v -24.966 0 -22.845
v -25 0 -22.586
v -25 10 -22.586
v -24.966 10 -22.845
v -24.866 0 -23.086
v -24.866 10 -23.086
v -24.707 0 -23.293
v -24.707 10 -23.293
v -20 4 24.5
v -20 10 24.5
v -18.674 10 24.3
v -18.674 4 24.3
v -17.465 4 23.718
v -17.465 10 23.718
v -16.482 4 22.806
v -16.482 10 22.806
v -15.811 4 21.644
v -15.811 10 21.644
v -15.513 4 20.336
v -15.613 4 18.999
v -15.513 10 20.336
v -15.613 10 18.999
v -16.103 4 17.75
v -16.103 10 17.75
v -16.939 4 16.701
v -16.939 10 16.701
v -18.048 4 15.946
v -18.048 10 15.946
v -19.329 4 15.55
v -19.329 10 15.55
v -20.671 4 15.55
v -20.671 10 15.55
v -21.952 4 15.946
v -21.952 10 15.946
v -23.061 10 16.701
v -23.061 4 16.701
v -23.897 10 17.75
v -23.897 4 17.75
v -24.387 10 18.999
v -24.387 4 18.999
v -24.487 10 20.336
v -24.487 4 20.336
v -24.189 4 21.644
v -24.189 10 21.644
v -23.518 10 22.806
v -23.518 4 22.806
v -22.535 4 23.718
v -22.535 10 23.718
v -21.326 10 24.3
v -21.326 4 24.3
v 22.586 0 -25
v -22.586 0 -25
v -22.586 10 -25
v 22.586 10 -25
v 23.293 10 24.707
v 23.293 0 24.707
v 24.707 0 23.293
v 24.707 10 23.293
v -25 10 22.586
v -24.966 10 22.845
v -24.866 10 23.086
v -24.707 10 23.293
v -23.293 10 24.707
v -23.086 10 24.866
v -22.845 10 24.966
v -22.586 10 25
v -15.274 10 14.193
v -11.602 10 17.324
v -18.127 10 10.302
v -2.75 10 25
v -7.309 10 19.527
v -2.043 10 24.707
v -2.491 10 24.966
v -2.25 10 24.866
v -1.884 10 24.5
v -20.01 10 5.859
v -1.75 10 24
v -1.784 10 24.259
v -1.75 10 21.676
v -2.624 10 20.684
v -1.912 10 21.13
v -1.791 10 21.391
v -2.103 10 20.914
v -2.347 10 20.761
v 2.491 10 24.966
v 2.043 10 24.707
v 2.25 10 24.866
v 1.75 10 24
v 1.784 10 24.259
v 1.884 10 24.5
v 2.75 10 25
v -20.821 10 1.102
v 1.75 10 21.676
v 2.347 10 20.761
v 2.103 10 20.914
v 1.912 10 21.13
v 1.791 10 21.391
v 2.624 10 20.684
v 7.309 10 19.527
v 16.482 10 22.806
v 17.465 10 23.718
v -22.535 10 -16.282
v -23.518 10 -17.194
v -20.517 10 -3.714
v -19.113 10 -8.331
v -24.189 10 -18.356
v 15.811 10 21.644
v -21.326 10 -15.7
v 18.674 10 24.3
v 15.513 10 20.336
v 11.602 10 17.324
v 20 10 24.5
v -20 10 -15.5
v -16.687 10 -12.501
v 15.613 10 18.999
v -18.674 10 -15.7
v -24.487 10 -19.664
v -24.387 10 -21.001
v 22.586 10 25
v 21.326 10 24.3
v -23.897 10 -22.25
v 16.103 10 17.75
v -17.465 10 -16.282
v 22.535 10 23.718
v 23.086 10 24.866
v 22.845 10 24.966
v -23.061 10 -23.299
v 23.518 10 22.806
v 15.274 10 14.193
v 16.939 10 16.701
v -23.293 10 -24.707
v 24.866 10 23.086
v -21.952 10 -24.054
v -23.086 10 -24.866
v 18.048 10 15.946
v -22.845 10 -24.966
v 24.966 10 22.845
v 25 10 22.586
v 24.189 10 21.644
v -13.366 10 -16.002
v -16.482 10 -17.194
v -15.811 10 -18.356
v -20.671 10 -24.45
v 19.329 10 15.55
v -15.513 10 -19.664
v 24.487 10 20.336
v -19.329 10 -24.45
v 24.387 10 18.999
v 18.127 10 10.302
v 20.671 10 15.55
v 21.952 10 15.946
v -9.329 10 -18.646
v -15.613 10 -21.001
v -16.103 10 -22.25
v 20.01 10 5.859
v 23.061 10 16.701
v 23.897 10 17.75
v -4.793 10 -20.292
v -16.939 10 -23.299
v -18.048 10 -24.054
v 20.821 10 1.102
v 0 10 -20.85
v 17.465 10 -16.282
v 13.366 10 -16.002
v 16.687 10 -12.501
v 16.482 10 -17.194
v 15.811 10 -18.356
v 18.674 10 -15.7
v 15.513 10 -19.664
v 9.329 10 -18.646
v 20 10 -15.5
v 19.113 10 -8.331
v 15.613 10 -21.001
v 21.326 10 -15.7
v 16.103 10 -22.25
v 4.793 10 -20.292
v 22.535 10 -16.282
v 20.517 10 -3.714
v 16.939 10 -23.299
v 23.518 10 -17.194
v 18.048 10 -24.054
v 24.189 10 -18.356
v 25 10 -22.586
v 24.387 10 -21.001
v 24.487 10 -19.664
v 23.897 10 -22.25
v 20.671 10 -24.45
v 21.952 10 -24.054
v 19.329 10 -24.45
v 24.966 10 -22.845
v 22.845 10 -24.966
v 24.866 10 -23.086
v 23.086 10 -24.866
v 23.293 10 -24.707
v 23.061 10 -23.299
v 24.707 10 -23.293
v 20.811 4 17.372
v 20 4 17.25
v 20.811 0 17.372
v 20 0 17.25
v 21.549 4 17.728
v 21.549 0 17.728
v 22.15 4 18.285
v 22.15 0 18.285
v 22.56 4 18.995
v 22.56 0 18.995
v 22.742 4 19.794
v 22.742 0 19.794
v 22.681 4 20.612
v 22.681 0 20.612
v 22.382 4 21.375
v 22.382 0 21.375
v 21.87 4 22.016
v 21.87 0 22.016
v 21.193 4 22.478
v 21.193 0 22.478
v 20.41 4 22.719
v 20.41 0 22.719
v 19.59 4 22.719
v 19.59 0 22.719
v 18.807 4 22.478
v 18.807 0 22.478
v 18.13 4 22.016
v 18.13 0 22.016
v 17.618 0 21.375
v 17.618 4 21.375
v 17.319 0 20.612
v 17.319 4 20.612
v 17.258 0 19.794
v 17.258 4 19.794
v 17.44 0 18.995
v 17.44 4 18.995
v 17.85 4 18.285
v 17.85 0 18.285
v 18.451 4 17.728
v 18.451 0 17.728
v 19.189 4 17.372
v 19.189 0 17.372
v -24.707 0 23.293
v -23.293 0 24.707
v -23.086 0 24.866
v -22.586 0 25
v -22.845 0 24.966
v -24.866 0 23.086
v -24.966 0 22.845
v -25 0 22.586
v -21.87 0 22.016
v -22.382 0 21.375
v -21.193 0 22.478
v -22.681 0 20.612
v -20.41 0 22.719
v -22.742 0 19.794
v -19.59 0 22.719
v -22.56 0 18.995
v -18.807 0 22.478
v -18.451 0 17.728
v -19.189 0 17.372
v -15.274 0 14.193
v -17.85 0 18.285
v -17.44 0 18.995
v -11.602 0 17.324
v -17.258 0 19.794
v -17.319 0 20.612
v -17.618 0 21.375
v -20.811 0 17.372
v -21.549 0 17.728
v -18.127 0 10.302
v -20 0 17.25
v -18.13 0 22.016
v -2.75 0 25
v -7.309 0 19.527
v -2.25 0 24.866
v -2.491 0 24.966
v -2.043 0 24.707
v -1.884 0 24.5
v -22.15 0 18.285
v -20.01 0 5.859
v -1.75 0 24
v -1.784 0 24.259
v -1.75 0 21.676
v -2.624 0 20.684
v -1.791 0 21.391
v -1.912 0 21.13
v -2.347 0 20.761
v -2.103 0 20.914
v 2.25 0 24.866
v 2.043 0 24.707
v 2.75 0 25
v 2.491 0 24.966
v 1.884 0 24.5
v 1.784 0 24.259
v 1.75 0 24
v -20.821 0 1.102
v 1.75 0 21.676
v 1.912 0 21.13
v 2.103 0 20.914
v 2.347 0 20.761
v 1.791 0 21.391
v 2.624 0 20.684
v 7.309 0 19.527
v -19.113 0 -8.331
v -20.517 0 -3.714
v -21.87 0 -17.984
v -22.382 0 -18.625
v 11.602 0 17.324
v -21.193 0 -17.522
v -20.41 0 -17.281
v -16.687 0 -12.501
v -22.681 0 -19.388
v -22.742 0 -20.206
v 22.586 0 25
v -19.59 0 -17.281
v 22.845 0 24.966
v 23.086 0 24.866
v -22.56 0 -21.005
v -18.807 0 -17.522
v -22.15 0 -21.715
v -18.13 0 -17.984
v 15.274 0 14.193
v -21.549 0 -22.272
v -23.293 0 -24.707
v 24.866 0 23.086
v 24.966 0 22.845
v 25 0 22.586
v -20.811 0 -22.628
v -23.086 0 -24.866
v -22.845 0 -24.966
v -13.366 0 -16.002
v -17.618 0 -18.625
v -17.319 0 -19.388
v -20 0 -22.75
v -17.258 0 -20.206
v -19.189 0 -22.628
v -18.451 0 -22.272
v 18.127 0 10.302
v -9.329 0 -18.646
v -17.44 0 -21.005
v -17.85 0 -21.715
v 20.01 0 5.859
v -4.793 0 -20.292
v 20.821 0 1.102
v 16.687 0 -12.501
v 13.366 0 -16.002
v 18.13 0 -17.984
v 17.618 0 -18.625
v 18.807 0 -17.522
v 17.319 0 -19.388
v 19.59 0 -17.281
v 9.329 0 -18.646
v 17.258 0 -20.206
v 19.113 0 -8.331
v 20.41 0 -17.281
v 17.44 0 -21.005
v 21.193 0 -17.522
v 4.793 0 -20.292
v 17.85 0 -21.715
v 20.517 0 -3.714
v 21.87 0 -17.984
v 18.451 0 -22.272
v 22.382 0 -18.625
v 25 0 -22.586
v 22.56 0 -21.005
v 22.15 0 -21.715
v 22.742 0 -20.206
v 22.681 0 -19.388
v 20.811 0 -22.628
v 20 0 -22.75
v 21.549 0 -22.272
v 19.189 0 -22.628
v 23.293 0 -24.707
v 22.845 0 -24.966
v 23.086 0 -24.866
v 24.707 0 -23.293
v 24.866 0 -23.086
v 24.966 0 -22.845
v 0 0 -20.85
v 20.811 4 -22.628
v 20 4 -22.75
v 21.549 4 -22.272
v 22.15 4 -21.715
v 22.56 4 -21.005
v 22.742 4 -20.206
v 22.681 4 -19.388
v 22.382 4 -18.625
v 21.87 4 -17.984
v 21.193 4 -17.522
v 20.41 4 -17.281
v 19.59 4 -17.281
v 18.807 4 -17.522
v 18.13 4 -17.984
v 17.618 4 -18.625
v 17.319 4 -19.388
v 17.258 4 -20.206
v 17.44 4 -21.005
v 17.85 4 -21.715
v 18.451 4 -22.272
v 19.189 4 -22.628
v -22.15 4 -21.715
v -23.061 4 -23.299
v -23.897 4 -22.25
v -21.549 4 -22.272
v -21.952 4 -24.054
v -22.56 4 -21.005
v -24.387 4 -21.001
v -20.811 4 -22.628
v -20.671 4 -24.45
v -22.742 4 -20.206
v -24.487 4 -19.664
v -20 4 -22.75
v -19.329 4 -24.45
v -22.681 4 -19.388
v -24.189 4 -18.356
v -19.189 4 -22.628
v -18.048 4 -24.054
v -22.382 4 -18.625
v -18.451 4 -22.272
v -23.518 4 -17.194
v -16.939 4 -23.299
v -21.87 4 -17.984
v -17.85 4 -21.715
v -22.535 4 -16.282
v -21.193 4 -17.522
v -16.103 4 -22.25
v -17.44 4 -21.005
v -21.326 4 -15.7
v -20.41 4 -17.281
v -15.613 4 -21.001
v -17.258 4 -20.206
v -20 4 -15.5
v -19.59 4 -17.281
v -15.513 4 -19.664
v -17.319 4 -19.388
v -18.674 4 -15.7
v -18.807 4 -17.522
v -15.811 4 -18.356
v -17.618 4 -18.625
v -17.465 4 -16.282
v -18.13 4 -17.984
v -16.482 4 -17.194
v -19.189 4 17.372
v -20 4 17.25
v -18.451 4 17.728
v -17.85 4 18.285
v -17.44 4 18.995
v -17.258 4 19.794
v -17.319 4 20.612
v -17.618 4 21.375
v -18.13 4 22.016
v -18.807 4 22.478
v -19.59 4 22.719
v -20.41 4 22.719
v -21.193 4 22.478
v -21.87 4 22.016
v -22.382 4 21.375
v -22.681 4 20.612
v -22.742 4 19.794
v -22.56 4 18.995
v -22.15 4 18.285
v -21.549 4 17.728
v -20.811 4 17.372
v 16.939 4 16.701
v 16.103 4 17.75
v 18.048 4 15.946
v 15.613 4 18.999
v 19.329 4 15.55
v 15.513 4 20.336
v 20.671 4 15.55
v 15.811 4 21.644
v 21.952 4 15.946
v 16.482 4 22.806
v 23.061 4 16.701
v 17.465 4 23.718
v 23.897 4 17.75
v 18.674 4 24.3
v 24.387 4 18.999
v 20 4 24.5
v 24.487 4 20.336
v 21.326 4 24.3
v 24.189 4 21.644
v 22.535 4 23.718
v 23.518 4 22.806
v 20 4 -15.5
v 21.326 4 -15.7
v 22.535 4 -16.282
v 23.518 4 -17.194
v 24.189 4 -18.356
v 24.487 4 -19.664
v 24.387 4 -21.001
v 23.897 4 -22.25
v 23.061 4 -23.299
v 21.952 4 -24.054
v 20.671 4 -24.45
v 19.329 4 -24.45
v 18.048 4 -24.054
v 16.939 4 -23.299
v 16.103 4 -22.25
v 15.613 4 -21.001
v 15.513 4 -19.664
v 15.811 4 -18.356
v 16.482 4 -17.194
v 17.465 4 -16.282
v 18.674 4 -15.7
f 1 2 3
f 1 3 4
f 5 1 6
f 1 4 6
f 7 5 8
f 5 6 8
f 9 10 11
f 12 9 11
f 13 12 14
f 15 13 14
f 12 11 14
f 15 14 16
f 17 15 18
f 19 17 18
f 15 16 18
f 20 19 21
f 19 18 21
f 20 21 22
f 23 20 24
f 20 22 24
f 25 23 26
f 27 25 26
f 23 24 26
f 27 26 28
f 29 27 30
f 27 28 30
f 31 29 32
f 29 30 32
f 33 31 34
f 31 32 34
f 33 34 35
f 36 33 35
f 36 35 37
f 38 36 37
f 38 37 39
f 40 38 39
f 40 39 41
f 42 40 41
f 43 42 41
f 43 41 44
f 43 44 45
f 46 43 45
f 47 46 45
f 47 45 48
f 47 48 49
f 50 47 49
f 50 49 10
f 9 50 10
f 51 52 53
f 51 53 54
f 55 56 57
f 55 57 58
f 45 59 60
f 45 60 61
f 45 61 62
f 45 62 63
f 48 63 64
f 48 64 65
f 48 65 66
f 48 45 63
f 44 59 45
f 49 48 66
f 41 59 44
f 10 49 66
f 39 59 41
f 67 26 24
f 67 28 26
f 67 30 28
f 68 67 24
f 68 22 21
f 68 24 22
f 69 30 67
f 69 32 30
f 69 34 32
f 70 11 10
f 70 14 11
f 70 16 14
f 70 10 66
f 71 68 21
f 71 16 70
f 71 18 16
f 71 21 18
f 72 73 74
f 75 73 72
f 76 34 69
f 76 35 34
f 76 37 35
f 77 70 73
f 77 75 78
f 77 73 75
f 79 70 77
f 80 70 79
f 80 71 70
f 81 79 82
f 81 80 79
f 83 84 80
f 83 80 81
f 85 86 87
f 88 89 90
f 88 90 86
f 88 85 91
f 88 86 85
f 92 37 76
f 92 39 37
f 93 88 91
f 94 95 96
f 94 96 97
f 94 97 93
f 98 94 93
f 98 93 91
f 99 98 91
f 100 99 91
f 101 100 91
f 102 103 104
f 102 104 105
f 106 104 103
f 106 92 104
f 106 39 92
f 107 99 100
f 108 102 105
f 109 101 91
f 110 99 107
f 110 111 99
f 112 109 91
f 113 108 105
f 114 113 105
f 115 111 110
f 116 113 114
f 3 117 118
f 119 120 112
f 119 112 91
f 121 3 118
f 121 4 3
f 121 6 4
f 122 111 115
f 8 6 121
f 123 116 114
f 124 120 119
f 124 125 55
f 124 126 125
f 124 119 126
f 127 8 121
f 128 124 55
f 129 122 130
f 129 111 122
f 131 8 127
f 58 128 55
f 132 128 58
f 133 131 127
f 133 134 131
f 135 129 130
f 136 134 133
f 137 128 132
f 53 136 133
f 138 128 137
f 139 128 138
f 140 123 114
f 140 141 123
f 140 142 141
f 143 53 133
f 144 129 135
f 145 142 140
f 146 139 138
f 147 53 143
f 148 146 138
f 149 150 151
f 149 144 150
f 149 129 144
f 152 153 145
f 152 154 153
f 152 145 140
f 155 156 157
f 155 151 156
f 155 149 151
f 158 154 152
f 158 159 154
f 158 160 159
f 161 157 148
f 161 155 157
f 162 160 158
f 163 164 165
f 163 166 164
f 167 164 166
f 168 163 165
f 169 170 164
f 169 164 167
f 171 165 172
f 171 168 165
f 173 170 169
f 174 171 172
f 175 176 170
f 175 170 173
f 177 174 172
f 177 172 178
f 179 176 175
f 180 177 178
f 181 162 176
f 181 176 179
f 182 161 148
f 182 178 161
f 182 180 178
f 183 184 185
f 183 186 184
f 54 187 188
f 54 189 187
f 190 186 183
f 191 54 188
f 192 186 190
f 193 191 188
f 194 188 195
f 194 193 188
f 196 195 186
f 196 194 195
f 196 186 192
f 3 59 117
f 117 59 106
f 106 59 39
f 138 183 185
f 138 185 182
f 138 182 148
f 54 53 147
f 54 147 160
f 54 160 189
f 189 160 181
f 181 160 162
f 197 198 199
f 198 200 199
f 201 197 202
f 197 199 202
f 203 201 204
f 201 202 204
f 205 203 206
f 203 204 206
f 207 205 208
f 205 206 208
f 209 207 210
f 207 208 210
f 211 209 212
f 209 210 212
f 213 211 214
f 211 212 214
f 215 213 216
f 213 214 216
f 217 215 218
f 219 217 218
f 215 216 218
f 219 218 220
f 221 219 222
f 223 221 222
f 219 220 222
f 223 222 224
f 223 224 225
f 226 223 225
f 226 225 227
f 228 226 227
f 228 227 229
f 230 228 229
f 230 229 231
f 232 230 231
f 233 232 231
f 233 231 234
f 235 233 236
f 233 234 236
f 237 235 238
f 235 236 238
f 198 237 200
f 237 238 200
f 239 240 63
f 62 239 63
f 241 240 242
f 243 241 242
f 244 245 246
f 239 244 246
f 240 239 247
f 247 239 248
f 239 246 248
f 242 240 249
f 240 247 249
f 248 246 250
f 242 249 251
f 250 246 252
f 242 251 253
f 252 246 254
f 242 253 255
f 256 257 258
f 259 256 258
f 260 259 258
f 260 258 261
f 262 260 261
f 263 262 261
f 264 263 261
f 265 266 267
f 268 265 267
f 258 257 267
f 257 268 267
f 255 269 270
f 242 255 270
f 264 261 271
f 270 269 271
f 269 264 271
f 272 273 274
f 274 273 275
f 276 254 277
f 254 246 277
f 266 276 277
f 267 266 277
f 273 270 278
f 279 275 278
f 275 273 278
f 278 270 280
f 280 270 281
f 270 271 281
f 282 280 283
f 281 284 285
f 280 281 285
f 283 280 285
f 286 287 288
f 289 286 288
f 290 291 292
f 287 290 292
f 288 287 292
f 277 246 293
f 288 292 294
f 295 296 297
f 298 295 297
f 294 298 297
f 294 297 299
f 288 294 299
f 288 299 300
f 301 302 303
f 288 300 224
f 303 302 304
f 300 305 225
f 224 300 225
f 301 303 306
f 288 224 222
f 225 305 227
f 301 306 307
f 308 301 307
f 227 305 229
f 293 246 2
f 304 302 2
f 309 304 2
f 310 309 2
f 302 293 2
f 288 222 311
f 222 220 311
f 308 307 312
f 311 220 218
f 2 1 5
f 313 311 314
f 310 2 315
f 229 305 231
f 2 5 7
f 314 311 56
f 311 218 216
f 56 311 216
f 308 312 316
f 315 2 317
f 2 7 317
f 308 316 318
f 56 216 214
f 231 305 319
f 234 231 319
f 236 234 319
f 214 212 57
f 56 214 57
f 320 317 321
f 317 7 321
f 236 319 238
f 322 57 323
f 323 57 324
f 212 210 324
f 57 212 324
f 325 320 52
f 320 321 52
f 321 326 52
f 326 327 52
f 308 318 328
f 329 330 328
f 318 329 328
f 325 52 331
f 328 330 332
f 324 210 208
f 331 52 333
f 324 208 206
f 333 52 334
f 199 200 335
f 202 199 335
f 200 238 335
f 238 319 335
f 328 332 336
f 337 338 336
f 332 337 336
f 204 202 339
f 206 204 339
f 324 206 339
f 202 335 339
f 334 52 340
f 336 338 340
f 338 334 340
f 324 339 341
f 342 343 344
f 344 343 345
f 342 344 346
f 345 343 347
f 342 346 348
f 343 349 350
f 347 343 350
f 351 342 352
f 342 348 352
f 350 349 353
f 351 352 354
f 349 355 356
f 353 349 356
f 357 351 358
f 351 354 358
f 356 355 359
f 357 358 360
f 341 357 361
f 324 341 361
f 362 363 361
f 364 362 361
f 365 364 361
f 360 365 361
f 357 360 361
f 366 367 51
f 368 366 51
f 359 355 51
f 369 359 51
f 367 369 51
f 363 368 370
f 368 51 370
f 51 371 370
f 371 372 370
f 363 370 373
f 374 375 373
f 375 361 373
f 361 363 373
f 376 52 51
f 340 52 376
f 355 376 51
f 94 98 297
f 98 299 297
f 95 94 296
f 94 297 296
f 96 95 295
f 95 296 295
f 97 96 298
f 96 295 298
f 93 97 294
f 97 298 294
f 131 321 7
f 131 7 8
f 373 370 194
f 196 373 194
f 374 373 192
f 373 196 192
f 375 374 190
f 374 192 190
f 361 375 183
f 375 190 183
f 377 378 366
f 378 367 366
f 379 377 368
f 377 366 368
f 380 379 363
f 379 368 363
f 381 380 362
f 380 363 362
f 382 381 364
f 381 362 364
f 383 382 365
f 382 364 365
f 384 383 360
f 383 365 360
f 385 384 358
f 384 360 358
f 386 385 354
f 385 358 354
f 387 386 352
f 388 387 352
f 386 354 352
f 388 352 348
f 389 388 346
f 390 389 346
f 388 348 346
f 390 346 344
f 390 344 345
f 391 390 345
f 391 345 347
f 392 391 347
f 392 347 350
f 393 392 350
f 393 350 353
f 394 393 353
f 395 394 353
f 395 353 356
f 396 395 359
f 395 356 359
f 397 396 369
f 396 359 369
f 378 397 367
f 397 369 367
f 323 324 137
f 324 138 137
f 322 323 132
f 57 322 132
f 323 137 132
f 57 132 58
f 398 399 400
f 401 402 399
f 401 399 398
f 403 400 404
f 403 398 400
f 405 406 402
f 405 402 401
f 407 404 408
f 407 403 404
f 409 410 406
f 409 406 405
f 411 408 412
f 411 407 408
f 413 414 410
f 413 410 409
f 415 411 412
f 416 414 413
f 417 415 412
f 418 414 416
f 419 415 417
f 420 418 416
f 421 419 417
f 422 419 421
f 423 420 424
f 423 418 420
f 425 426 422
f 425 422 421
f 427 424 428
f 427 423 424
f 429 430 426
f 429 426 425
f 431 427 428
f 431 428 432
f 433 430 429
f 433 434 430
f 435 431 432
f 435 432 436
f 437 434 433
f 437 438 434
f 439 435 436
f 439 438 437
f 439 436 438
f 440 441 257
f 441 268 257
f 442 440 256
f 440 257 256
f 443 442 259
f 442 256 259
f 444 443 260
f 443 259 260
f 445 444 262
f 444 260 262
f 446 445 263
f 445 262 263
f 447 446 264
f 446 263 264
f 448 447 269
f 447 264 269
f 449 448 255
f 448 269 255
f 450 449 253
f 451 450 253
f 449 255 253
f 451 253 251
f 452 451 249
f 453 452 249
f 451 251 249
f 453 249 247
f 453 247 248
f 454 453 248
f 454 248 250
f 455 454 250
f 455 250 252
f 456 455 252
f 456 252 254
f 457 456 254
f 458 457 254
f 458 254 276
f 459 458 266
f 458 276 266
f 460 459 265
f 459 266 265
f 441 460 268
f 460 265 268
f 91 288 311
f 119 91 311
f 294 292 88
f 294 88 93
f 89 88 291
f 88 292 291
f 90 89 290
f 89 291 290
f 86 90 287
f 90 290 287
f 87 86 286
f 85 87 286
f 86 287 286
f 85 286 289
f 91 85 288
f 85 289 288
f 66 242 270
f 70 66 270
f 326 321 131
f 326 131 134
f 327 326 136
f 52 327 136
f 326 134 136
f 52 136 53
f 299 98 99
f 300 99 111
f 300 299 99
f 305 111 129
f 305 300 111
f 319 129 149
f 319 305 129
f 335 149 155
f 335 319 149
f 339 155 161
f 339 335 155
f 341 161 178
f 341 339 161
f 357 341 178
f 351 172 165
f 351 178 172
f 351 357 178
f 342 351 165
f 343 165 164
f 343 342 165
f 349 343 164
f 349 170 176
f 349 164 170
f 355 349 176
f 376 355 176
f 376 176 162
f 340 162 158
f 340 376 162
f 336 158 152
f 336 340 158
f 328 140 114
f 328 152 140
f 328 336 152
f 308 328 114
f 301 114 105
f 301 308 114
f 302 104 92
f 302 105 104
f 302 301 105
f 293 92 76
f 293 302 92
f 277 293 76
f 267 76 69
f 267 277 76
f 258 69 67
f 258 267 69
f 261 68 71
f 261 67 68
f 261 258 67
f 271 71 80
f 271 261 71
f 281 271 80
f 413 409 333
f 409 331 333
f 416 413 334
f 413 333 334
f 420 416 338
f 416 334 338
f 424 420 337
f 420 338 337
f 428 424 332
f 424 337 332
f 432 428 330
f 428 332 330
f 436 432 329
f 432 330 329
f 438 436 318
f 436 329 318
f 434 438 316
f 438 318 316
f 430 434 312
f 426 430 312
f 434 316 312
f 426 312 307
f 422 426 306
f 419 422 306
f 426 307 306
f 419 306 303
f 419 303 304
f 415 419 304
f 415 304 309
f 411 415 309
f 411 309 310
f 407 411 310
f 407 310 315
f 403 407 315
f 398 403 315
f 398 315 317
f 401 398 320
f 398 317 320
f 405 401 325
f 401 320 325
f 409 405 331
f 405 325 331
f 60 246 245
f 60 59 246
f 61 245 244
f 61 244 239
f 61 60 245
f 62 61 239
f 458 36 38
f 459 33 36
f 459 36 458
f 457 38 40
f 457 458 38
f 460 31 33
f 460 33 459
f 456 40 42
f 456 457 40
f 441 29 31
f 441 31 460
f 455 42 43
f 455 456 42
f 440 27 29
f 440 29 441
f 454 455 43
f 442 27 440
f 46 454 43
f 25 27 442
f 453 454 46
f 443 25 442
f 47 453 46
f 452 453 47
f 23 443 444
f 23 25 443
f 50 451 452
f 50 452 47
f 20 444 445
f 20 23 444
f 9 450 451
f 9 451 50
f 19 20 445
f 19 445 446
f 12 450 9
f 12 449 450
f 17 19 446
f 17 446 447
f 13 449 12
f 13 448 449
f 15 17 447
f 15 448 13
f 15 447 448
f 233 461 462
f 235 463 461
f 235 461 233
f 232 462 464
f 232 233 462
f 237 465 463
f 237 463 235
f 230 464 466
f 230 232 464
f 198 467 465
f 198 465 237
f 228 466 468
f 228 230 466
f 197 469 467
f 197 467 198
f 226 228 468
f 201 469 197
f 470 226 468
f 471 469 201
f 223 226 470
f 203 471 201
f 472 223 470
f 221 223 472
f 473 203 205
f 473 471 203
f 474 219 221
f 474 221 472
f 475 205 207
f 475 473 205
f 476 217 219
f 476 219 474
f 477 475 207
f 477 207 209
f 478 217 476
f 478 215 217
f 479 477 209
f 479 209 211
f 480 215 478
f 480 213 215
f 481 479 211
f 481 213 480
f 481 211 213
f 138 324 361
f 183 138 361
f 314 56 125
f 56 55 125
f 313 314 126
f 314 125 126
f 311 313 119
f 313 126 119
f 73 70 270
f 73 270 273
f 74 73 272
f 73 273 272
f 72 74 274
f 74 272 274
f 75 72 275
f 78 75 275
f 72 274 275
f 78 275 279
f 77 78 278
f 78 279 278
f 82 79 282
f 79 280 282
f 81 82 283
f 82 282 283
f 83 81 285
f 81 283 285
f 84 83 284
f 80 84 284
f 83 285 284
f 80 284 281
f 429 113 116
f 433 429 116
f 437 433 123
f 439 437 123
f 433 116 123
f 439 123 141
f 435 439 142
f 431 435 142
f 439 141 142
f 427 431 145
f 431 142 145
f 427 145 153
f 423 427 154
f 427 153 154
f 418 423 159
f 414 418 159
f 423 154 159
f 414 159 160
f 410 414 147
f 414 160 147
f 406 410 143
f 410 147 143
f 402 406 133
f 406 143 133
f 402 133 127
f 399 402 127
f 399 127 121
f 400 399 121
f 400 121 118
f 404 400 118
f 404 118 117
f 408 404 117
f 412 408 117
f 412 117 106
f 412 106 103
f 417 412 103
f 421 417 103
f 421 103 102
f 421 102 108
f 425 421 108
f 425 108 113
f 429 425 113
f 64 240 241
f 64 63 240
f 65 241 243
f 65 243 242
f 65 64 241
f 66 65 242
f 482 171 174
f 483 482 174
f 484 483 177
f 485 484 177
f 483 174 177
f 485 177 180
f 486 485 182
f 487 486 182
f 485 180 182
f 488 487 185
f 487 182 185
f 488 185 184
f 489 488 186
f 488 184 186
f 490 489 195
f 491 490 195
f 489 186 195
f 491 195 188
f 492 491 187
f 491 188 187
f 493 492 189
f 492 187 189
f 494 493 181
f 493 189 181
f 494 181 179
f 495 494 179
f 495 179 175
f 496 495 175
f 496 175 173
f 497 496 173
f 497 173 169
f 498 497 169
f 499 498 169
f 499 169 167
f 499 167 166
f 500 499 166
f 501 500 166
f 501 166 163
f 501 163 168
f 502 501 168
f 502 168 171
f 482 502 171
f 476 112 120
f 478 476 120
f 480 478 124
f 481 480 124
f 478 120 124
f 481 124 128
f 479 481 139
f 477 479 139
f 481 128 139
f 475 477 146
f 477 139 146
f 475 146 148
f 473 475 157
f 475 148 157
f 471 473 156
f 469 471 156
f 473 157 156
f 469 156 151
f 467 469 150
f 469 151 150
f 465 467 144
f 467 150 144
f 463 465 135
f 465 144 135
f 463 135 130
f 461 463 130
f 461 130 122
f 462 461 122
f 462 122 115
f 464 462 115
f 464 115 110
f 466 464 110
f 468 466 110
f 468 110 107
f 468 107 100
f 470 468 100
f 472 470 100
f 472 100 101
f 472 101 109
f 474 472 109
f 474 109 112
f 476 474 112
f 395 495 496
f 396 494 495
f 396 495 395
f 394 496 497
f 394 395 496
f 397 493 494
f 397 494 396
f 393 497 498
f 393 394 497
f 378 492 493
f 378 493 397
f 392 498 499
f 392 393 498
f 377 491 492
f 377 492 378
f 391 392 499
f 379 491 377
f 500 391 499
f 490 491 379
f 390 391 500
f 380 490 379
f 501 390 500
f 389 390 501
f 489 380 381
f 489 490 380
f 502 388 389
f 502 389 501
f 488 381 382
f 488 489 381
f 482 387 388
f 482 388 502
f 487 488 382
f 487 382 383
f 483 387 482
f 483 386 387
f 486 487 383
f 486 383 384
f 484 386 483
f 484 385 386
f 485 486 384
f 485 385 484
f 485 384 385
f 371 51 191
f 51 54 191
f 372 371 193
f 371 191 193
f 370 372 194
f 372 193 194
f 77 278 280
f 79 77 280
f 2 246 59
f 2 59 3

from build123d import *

# Parameters (mm, degrees)
SKETCH1_W                                           = 50
SKETCH1_H                                           = 50
SKETCH1_R                                           = 20.85
BOSS_EXTRUDE1_DEPTH                                 = 10
SKETCH2_W                                           = 3.5
SKETCH2_H                                           = 12.12353247
CUT_EXTRUDE1_DEPTH                                  = 10
CHAMFER1_SIZE                                       = 2
FILLET1_R                                           = 1
F_5_2_5_2_DIAMETER_HOLE1_D                          = 5.2
F_5_2_5_2_DIAMETER_HOLE1_DEPTH                      = 10
F_5_2_5_2_DIAMETER_HOLE1_TIP                        = 1.562237609
CBORE_FOR_M5_HEX_SOCKET_HEAD_CAP_SCREW1_D           = 5.5
CBORE_FOR_M5_HEX_SOCKET_HEAD_CAP_SCREW1_CBORE_D     = 9
CBORE_FOR_M5_HEX_SOCKET_HEAD_CAP_SCREW1_CBORE_DEPTH = 6


with BuildPart() as part:
    # Sketch1 → Boss-Extrude1 (new body)
    with BuildSketch(Plane(origin=(0, 0, 0), x_dir=(1, 0, 0), z_dir=(0, 1, 0))):
        Rectangle(SKETCH1_W, SKETCH1_H)
        Circle(SKETCH1_R, mode=Mode.SUBTRACT)
    extrude(amount=BOSS_EXTRUDE1_DEPTH)

    # Sketch2 → Cut-Extrude1 (cut)
    with BuildSketch(Plane(origin=(0, 10, 0), x_dir=(1, 0, 0), z_dir=(0, 1, 0))):
        with Locations((0, -25)):
            Rectangle(SKETCH2_W, SKETCH2_H)
    extrude(amount=-CUT_EXTRUDE1_DEPTH, mode=Mode.SUBTRACT)

    # Chamfer1
    chamfer1_edges = [part.edges().sort_by_distance(p)[0] for p in [
        (25, 5, 25),
        (-25, 5, 25),
        (-25, 5, -25),
        (25, 5, -25),
    ]]
    chamfer(chamfer1_edges, length=CHAMFER1_SIZE)

    # Fillet1
    fillet1_edges = [part.edges().sort_by_distance(p)[0] for p in [
        (-1.75, 5, 20.776428952),
        (1.75, 5, 20.776428952),
        (1.75, 5, 25),
        (-1.75, 5, 25),
        (-25, 5, 23),
        (-25, 5, -23),
        (23, 5, -25),
        (-23, 5, -25),
        (-23, 5, 25),
        (25, 5, 23),
        (25, 5, -23),
        (23, 5, 25),
    ]]
    fillet(fillet1_edges, radius=FILLET1_R)

    # Ø5.2 (5.2) Diameter Hole1
    with Locations(Plane(origin=(-20, 10, -20), x_dir=(0, 0, 1), z_dir=(0, 1, 0))):
        with Locations((0, 0), (0, 40), (40, 40), (40, 0)):
            Hole(F_5_2_5_2_DIAMETER_HOLE1_D / 2, depth=F_5_2_5_2_DIAMETER_HOLE1_DEPTH)
            with Locations((0, 0, -(F_5_2_5_2_DIAMETER_HOLE1_DEPTH + F_5_2_5_2_DIAMETER_HOLE1_TIP / 2))):  # 118° drill point
                Cone(0, F_5_2_5_2_DIAMETER_HOLE1_D / 2, F_5_2_5_2_DIAMETER_HOLE1_TIP, mode=Mode.SUBTRACT)

    # CBORE for M5 Hex Socket Head Cap Screw1 (through all)
    with Locations(Plane(origin=(-20, 10, -20), x_dir=(0, 0, 1), z_dir=(0, 1, 0))):
        with Locations((0, 0), (40, 0), (40, 40), (0, 40)):
            CounterBoreHole(CBORE_FOR_M5_HEX_SOCKET_HEAD_CAP_SCREW1_D / 2, CBORE_FOR_M5_HEX_SOCKET_HEAD_CAP_SCREW1_CBORE_D / 2, CBORE_FOR_M5_HEX_SOCKET_HEAD_CAP_SCREW1_CBORE_DEPTH)


solid = part.part
